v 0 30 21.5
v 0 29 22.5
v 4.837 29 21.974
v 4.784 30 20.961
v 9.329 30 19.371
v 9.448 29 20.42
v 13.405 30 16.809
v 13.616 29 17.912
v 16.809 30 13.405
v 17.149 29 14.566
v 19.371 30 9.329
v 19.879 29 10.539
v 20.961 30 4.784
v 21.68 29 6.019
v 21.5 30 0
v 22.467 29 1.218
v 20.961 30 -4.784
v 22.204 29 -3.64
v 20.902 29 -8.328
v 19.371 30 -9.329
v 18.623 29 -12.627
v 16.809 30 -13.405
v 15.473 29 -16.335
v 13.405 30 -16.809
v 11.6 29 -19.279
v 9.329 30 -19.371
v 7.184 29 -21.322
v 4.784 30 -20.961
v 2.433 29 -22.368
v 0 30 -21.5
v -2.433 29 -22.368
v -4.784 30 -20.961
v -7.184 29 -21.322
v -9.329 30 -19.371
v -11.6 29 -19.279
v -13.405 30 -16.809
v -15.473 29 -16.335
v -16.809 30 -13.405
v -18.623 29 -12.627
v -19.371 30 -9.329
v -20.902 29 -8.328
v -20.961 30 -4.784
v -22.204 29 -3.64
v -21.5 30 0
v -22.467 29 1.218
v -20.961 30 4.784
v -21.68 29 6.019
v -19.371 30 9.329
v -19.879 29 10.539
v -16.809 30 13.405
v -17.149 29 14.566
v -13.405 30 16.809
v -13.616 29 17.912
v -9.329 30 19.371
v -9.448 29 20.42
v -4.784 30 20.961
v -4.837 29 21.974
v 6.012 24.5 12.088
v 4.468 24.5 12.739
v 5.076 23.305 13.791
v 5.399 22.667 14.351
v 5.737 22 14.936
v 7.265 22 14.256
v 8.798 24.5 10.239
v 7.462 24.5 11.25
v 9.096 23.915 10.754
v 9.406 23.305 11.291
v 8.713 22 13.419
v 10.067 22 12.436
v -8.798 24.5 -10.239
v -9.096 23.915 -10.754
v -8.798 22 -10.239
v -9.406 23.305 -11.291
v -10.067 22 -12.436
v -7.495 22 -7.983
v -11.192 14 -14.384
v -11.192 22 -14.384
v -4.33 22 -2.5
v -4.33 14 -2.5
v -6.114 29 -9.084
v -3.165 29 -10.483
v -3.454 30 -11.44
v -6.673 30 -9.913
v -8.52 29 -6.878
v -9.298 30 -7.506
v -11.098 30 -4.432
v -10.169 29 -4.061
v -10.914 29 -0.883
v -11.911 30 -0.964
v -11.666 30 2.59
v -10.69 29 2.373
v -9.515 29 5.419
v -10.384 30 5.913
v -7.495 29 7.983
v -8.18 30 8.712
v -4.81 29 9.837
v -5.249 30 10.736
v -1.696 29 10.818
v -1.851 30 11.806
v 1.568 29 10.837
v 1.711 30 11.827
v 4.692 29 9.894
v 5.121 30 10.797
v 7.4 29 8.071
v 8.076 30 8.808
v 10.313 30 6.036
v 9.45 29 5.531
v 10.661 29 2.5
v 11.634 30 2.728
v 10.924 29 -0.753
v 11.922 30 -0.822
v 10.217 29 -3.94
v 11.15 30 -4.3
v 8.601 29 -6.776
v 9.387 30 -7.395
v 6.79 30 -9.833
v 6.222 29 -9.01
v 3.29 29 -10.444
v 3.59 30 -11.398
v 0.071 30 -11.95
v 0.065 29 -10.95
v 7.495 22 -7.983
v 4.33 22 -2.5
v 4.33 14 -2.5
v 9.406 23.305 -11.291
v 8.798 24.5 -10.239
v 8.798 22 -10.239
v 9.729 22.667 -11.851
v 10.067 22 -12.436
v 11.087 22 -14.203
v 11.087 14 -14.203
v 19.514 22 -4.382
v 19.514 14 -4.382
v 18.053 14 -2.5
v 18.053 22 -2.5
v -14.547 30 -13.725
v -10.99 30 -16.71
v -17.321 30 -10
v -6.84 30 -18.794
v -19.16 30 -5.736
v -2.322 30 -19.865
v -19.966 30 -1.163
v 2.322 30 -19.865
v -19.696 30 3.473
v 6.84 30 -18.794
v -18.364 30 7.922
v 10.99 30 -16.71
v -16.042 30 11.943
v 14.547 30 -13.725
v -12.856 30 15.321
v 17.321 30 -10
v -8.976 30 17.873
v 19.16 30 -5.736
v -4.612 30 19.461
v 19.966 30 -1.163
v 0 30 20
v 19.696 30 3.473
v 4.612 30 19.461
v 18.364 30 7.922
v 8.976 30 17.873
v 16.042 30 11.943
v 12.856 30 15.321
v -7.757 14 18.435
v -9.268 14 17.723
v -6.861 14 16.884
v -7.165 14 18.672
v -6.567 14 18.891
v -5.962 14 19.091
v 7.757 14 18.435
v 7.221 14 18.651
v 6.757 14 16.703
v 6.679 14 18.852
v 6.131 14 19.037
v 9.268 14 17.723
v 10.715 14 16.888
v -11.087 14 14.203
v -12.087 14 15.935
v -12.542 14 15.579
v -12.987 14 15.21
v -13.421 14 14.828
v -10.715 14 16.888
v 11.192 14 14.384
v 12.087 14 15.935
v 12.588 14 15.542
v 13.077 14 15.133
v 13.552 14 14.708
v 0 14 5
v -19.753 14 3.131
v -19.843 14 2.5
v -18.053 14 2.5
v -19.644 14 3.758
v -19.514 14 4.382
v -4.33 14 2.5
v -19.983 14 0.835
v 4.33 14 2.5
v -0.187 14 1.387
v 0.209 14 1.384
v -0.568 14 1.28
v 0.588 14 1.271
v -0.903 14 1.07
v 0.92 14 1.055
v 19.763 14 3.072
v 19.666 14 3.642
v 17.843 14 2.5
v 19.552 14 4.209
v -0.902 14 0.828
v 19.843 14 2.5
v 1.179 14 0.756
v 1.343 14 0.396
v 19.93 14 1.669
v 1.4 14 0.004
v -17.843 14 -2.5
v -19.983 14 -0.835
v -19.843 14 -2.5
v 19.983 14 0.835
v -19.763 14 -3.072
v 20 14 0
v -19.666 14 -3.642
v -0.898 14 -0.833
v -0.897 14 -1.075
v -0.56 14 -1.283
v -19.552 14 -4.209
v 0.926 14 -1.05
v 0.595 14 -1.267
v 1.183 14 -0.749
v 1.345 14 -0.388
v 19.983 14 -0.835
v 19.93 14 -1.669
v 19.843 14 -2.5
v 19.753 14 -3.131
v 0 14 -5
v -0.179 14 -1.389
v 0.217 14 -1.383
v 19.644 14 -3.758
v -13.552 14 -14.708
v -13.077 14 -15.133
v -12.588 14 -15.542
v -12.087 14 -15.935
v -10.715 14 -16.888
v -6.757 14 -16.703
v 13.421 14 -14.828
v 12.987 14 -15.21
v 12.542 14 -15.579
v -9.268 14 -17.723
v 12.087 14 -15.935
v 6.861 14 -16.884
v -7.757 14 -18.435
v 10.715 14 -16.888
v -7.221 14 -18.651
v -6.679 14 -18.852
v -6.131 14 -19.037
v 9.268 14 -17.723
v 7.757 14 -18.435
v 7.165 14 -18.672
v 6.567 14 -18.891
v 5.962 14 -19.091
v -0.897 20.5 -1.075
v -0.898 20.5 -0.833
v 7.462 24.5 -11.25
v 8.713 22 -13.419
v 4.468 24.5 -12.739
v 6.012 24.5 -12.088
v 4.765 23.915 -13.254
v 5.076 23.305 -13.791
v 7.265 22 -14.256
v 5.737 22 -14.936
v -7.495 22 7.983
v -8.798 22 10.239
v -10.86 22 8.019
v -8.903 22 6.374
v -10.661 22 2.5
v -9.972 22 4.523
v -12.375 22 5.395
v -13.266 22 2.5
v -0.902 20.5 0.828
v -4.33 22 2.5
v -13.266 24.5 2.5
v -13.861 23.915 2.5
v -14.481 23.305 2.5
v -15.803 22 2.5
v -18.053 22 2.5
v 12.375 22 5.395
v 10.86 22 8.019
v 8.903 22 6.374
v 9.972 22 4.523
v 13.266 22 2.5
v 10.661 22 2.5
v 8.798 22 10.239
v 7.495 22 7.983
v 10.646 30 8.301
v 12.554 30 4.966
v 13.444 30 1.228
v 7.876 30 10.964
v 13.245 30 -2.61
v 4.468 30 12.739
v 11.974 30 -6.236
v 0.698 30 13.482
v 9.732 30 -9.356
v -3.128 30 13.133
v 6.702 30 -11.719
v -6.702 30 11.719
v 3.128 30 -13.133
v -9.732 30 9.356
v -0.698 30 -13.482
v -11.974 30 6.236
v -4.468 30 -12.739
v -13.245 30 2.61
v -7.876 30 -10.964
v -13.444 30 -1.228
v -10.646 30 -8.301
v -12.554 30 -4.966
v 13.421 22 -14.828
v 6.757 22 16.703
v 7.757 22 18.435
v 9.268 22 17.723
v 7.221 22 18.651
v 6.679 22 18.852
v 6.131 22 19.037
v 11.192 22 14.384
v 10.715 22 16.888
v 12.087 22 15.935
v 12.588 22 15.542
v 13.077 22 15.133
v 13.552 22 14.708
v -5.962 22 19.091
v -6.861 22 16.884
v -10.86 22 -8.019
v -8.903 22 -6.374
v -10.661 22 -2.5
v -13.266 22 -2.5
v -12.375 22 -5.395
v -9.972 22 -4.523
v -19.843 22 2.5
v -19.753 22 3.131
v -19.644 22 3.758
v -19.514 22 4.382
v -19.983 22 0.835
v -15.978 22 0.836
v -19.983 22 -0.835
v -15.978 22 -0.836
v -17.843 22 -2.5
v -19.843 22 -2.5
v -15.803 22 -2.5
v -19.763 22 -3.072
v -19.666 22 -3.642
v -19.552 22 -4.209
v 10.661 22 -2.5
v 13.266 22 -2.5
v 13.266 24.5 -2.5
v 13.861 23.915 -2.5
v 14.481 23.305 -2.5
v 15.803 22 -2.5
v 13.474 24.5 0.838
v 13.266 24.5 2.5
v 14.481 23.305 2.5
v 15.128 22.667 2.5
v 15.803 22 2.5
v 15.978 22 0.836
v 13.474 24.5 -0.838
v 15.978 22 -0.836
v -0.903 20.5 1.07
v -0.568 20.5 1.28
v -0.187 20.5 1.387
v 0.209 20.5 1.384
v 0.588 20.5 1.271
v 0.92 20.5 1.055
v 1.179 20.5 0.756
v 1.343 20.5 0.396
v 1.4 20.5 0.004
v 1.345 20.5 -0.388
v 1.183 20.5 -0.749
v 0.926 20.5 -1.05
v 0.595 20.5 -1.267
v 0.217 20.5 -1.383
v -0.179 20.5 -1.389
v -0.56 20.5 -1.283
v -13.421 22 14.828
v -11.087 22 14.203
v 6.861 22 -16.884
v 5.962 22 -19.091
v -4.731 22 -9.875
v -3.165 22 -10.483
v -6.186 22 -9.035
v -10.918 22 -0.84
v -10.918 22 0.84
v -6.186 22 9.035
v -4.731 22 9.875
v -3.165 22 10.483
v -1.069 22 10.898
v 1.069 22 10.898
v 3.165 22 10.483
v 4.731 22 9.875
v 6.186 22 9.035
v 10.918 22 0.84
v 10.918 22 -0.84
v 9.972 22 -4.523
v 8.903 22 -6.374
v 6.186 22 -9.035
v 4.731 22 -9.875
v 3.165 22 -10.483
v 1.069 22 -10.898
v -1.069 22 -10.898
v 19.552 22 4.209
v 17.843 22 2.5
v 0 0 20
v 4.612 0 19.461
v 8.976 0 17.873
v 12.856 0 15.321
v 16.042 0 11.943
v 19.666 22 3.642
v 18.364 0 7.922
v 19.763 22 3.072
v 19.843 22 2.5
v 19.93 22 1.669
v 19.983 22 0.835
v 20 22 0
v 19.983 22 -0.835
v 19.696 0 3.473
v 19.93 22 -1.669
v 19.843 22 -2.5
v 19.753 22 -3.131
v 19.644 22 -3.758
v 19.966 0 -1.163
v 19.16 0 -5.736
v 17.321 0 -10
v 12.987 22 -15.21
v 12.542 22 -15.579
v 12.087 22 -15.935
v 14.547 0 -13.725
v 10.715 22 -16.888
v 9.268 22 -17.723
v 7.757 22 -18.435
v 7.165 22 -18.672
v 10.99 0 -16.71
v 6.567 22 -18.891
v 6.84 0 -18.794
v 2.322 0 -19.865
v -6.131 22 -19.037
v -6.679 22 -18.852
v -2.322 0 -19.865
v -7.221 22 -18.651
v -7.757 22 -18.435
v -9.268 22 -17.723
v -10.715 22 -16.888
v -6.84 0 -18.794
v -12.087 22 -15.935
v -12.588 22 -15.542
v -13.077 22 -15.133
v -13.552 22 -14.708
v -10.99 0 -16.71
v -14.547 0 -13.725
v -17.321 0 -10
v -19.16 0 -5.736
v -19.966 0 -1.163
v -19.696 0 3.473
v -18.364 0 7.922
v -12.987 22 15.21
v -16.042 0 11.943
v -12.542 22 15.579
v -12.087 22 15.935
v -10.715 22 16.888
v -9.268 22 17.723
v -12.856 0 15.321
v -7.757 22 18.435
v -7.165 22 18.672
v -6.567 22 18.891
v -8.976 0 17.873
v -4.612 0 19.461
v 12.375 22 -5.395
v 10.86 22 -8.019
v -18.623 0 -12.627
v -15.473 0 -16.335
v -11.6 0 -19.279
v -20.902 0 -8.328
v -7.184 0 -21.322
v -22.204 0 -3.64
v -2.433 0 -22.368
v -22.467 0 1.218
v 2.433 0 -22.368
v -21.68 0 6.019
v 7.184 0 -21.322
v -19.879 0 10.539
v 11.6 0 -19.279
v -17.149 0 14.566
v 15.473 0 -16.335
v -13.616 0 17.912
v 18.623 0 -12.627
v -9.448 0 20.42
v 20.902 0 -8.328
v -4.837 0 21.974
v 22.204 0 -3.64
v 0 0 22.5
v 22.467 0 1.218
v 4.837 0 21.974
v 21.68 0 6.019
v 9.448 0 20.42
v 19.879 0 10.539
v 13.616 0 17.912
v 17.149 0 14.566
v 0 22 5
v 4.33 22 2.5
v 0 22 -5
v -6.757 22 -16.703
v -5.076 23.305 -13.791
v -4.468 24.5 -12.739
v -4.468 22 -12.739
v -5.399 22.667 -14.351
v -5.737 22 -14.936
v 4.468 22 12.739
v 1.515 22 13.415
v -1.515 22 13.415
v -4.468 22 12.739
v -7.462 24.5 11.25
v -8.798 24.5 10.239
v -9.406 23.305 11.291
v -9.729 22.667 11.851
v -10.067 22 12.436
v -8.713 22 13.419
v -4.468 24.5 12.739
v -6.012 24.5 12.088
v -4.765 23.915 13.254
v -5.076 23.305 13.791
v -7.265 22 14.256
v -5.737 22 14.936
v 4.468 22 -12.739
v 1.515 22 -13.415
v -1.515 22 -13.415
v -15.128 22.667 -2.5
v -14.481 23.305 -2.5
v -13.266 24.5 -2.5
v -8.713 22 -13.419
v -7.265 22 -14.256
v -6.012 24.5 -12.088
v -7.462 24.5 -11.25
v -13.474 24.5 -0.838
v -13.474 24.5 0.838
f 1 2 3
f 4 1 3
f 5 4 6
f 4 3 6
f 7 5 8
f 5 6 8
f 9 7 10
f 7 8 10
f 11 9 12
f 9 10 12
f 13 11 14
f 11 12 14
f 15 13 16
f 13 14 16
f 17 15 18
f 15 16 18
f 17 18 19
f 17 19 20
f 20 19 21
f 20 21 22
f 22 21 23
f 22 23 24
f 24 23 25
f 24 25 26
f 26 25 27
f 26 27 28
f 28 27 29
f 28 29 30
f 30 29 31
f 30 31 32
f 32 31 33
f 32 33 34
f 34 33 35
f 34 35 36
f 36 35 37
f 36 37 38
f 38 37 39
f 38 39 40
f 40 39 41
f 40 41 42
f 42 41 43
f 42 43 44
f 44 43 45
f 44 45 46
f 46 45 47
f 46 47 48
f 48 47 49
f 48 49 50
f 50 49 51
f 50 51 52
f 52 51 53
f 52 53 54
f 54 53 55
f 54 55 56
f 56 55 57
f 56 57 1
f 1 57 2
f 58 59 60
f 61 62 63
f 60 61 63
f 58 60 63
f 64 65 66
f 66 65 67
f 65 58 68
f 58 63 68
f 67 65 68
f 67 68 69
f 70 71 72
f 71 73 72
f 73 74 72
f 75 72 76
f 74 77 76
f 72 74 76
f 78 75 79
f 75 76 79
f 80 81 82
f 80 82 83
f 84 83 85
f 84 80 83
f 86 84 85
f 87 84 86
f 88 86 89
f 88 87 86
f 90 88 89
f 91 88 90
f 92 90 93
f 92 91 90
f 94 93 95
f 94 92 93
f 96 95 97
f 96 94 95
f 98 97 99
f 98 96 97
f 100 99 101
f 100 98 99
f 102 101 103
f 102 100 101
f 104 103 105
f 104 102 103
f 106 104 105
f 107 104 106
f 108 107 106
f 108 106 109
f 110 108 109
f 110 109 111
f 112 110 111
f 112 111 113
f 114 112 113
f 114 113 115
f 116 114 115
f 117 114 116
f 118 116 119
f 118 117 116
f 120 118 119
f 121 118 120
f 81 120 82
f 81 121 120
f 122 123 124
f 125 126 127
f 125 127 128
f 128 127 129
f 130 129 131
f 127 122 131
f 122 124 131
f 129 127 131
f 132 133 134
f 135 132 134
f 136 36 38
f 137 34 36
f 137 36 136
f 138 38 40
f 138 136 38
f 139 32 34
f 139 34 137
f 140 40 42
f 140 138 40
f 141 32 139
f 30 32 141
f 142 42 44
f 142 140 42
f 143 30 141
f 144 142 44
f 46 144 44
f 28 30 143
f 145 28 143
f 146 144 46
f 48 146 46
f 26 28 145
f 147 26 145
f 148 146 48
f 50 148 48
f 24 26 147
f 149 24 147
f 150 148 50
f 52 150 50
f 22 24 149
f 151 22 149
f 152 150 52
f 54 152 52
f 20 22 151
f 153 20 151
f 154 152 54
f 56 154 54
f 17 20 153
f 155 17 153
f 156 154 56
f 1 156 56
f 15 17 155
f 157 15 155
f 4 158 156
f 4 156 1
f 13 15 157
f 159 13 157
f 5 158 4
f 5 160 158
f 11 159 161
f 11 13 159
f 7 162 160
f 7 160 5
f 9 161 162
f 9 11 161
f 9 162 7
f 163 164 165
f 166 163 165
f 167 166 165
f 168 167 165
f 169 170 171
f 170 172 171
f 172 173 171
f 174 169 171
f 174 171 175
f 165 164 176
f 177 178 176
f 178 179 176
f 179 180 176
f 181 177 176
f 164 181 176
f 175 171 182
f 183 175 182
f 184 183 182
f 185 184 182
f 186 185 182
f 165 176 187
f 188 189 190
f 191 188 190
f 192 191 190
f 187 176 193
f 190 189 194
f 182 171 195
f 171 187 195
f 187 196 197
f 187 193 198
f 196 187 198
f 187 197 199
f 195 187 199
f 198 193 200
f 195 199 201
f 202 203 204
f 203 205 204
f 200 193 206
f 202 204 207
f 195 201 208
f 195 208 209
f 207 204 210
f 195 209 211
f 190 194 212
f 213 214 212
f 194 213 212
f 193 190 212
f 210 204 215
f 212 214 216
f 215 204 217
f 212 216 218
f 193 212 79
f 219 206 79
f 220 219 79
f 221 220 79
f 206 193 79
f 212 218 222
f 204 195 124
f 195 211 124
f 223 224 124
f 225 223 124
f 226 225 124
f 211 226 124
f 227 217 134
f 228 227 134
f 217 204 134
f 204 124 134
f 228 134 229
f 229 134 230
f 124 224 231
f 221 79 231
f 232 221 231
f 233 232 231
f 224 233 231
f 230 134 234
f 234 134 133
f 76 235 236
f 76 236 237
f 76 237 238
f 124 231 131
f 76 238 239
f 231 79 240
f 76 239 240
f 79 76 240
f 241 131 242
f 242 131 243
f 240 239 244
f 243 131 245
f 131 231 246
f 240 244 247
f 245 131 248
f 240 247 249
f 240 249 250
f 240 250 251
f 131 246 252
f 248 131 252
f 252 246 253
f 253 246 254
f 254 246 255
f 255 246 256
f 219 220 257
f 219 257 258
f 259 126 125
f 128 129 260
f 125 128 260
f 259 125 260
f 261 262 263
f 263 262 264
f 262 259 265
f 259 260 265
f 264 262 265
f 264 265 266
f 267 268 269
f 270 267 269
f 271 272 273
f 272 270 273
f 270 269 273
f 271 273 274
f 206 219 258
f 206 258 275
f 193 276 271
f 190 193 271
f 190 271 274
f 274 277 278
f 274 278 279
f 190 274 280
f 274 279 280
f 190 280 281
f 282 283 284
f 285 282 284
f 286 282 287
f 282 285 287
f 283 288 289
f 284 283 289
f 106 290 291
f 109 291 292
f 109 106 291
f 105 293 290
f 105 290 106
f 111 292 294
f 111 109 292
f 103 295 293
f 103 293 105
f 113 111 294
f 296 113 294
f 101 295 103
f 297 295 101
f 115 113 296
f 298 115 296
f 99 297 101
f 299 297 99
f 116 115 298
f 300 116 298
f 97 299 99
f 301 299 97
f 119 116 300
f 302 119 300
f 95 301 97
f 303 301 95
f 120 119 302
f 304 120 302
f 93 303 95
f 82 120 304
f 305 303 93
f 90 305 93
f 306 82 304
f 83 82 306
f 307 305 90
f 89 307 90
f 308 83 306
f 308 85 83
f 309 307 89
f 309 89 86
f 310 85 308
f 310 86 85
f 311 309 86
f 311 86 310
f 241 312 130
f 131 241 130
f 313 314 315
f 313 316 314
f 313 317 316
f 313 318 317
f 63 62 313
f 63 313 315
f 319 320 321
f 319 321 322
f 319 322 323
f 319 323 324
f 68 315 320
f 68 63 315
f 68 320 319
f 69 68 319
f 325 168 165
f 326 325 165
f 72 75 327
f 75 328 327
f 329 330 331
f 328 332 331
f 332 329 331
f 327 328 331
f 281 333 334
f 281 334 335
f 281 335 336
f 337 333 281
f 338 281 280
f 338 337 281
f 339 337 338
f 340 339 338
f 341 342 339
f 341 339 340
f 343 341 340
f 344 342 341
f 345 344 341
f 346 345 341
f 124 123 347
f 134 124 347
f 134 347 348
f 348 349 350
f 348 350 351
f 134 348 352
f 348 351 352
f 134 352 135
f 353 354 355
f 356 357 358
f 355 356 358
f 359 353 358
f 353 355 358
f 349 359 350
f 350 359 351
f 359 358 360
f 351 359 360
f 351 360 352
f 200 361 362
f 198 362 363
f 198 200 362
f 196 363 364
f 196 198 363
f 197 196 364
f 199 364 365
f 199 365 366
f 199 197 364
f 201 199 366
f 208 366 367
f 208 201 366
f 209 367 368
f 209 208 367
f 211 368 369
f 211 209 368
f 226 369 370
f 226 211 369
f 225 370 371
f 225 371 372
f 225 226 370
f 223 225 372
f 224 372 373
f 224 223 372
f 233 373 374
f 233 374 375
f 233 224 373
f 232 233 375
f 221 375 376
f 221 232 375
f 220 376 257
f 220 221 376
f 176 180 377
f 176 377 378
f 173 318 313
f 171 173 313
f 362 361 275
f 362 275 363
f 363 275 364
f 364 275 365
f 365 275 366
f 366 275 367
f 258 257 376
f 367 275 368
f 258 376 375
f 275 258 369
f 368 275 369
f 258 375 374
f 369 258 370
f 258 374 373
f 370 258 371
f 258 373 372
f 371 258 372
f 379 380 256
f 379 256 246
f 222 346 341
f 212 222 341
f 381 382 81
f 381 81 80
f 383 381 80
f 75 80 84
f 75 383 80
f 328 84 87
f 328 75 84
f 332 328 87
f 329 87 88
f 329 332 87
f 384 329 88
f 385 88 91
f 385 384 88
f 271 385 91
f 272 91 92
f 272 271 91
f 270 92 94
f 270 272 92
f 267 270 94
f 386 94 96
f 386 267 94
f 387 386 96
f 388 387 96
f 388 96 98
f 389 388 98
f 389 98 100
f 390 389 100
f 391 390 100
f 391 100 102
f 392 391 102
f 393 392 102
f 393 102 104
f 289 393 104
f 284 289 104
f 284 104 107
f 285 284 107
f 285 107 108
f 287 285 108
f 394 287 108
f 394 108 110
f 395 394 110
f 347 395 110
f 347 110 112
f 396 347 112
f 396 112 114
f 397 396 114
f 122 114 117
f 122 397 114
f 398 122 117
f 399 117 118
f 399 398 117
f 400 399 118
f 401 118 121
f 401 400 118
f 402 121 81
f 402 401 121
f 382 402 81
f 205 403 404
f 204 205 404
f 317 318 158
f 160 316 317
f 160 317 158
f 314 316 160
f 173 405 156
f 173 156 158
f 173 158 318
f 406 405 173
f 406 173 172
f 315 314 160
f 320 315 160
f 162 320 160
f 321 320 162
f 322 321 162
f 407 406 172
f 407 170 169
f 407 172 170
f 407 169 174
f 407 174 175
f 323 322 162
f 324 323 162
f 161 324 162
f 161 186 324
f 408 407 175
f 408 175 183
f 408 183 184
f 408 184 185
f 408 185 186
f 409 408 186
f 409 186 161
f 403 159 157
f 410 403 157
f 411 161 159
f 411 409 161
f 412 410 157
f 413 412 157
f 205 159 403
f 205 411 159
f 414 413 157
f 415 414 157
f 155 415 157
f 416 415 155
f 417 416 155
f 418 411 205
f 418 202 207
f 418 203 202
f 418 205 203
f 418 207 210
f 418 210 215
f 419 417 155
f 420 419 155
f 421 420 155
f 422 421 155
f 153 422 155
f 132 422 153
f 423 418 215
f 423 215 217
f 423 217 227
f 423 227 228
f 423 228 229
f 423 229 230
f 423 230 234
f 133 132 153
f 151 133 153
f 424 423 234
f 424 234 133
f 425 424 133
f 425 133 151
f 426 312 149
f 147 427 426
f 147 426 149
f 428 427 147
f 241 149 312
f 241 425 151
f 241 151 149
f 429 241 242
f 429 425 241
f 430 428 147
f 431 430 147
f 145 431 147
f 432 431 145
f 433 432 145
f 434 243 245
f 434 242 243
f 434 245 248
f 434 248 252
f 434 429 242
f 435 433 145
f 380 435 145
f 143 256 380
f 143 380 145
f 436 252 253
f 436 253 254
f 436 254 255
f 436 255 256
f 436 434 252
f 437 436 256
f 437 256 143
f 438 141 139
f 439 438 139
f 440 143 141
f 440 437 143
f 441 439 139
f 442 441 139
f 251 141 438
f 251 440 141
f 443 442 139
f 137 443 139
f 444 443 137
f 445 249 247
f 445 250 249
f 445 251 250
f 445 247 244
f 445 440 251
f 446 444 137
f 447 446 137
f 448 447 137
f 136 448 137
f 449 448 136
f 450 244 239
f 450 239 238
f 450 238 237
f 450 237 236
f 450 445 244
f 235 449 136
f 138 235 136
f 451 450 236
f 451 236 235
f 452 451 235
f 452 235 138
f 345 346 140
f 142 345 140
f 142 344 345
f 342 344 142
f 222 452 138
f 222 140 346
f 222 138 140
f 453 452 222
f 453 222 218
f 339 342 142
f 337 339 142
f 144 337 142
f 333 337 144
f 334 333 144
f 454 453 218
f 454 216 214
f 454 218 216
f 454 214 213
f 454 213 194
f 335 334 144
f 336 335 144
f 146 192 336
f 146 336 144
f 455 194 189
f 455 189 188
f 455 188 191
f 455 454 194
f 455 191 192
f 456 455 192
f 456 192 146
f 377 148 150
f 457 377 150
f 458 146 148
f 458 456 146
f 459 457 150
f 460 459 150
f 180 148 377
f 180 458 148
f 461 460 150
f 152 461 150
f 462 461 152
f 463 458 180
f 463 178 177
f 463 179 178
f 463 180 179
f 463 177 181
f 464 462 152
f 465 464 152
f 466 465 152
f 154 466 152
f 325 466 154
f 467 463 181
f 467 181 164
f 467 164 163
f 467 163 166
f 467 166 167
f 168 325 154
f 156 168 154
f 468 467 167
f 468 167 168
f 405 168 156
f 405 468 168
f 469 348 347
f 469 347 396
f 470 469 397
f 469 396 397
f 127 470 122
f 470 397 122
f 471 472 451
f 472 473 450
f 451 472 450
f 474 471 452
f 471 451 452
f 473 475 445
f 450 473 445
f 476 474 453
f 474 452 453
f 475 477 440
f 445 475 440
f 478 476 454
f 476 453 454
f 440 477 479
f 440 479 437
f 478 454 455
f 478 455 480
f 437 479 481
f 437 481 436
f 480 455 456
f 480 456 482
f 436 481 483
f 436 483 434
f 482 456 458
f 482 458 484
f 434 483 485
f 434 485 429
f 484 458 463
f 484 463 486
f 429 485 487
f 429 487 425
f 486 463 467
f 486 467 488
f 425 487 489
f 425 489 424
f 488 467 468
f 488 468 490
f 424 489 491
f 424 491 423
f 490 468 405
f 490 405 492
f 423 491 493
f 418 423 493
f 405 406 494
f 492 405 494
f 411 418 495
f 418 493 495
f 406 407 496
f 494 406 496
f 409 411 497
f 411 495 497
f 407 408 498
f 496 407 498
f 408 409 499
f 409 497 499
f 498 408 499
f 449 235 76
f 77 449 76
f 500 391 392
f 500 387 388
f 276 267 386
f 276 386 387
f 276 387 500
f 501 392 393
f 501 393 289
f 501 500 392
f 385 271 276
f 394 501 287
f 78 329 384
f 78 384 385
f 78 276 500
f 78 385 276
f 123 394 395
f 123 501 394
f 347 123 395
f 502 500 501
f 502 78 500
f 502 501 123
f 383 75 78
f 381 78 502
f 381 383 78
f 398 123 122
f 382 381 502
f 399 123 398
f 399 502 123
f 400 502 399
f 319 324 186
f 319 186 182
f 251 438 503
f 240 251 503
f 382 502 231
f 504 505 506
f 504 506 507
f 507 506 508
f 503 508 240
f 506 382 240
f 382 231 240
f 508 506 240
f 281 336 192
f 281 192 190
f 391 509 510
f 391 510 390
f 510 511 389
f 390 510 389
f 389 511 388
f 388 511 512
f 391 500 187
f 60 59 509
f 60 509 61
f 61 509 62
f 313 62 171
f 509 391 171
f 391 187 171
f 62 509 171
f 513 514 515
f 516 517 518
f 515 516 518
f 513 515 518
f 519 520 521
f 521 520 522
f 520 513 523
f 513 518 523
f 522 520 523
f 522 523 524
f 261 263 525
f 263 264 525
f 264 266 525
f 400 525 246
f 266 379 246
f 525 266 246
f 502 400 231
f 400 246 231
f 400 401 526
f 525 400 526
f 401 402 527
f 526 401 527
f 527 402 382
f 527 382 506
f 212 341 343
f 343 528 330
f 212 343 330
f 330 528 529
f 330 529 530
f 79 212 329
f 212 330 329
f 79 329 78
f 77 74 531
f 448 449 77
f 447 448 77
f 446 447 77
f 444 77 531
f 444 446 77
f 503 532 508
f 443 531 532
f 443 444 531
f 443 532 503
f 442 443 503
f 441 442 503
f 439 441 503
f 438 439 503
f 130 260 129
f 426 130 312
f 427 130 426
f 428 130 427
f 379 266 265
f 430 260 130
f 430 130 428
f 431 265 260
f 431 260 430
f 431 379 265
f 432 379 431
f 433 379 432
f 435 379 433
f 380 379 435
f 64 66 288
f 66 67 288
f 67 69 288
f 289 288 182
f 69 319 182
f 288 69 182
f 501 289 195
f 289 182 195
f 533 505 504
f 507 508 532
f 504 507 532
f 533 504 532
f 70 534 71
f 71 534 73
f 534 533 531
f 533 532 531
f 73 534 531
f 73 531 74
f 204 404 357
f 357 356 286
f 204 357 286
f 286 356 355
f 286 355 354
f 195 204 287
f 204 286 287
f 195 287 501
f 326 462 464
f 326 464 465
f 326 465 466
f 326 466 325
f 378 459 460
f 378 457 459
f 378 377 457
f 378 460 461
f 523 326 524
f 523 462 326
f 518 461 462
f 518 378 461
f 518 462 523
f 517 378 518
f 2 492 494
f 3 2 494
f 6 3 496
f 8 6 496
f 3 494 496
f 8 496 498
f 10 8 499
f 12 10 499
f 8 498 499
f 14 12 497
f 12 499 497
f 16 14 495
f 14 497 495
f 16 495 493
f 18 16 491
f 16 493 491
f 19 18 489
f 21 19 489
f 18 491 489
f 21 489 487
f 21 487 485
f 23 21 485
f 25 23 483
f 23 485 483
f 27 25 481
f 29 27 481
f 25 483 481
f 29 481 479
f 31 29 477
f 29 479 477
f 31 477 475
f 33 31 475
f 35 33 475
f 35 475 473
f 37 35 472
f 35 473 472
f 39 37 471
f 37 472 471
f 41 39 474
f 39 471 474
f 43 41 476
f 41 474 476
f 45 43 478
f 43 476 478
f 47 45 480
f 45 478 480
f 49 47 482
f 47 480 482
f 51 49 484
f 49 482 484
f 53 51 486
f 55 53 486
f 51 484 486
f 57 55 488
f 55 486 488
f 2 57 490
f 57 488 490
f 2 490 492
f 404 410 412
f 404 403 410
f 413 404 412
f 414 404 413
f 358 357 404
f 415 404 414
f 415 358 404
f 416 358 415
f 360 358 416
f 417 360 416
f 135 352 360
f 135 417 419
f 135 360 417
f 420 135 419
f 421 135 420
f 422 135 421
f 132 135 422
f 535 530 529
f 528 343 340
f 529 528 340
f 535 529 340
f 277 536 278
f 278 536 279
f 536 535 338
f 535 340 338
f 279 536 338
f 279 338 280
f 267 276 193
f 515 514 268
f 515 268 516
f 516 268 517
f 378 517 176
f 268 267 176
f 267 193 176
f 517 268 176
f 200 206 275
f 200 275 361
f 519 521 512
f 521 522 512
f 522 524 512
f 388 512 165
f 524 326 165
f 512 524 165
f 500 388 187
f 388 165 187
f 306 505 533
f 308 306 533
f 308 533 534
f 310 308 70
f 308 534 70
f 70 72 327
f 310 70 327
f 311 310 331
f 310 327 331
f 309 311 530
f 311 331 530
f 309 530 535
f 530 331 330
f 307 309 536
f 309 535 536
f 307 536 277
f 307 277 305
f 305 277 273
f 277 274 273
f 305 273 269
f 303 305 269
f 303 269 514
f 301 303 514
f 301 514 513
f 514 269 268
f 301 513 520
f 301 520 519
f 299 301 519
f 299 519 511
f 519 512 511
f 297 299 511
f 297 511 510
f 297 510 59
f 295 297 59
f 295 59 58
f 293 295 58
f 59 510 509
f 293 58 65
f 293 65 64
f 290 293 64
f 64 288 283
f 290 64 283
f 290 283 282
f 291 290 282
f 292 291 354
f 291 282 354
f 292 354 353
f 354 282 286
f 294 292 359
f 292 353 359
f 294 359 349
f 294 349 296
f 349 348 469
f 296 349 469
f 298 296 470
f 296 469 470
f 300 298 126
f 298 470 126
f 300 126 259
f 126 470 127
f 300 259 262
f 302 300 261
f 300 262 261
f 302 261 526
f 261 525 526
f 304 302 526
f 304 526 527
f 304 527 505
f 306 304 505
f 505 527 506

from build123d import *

# Parameters (mm, degrees)
SKETCH1_R               = 22.5
SKETCH1_R_2             = 20
BOSS_EXTRUDE1_DEPTH     = 30
BOSS_EXTRUDE2_DEPTH     = 4
CHAMFER1_SIZE           = 2
CHAMFER1_SIZE_2         = 1.79025908
CUT_EXTRUDE1_DEPTH      = 39.684622268
CUT_EXTRUDE1_DEPTH_BACK = 39.684622268
BOSS_EXTRUDE3_START     = -1.5
BOSS_EXTRUDE3_DEPTH     = 1.5
SKETCH6_R               = 13.5
SKETCH6_R_2             = 10.95
BOSS_EXTRUDE4_DEPTH     = 8
CHAMFER2_SIZE           = 1
CHAMFER3_SIZE           = 1
CHAMFER4_SIZE           = 2.5


with BuildPart() as part:
    # Sketch1 → Boss-Extrude1 (new body)
    with BuildSketch(Plane(origin=(0, 0, 0), x_dir=(1, 0, 0), z_dir=(0, 1, 0))):
        with Locations(Location((0, 0, 0), (0, 0, 270))):
            Circle(SKETCH1_R)
        with Locations(Location((0, 0, 0), (0, 0, 270))):
            Circle(SKETCH1_R_2, mode=Mode.SUBTRACT)
    extrude(amount=BOSS_EXTRUDE1_DEPTH)

    # Sketch2 → Boss-Extrude2 (add, symmetric)
    with BuildSketch(Plane(origin=(0, 18, 0), x_dir=(1, 0, 0), z_dir=(0, 1, 0))):
        with BuildLine():
            Line((-12.086630926, 15.934658856), (-4.330127019, 2.5))
            Line((-4.330127019, 2.5), (-19.843134833, 2.5))
            ThreePointArc((-19.843134833, 2.5), (-20, 0), (-19.843134833, -2.5))
            Line((-19.843134833, -2.5), (-4.330127019, -2.5))
            Line((-4.330127019, -2.5), (-12.086630926, -15.934658856))
            ThreePointArc((-12.086630926, -15.934658856), (-10, -17.320508076), (-7.756503907, -18.434658856))
            Line((-7.756503907, -18.434658856), (0, -5))
            Line((0, -5), (7.756503907, -18.434658856))
            ThreePointArc((7.756503907, -18.434658856), (10, -17.320508076), (12.086630926, -15.934658856))
            Line((12.086630926, -15.934658856), (4.330127019, -2.5))
            Line((4.330127019, -2.5), (19.843134833, -2.5))
            ThreePointArc((19.843134833, -2.5), (19.960745185, -1.252458251), (20, 0))
            ThreePointArc((20, 0), (19.960745185, 1.252458251), (19.843134833, 2.5))
            Line((19.843134833, 2.5), (4.330127019, 2.5))
            Line((4.330127019, 2.5), (12.086630926, 15.934658856))
            ThreePointArc((12.086630926, 15.934658856), (10, 17.320508076), (7.756503907, 18.434658856))
            Line((7.756503907, 18.434658856), (0, 5))
            Line((0, 5), (-7.756503907, 18.434658856))
            ThreePointArc((-7.756503907, 18.434658856), (-10, 17.320508076), (-12.086630926, 15.934658856))
        make_face()
    extrude(amount=BOSS_EXTRUDE2_DEPTH, both=True)

    # Chamfer1
    # the kernel refuses this chamfer: 2, 1.79025908 mm, written as the material it adds along each edge
    with BuildSketch(Plane(origin=(7.756503907, 22, 18.434658856), x_dir=(-0.9376749432180777, 0, 0.34751359809505994), z_dir=(0, -1, 0)), Plane(origin=(19.843134833, 22, 2.5), x_dir=(-0.16788186749818226, 0, 0.9858071203665161), z_dir=(0, -1, 0)), Plane(origin=(12.086630926, 22, -15.934658856), x_dir=(0.7697930757198956, 0, 0.6382935222714571), z_dir=(0, -1, 0)), Plane(origin=(-7.756503907, 22, -18.434658856), x_dir=(0.9376749432180783, 0, -0.34751359809505833), z_dir=(0, -1, 0)), Plane(origin=(-19.843134833, 22, -2.5), x_dir=(0.1678818674981782, 0, -0.9858071203665167), z_dir=(0, -1, 0)), Plane(origin=(-12.086630926, 22, 15.934658856), x_dir=(-0.7697930757198955, 0, -0.6382935222714572), z_dir=(0, -1, 0))) as chamfer1_piece_1:
        with BuildLine():
            Line((1.733569464, 0), (CHAMFER1_SIZE * 0.167881867498, CHAMFER1_SIZE * 0.985807120367))
            Line((CHAMFER1_SIZE * 0.167881867498, CHAMFER1_SIZE * 0.985807120367), (0, 0))
            ThreePointArc((0, 0), (0.889903139, -0.018778361), (1.733569464, 0))
        make_face()
    extrude(amount=8)
    with BuildSketch(Plane(origin=(12.086630926, 14, 15.934658856), x_dir=(0.7669529363679002, 0, -0.6417033531131466), z_dir=(0, 1, 0)), Plane(origin=(19.843134833, 14, -2.5), x_dir=(-0.17225493730569186, 0, -0.9850524029582447), z_dir=(0, 1, 0)), Plane(origin=(7.756503907, 14, -18.434658856), x_dir=(-0.9392078736735914, 0, -0.3433490498450975), z_dir=(0, 1, 0)), Plane(origin=(-12.086630926, 14, -15.934658856), x_dir=(-0.766952936367899, 0, 0.641703353113148), z_dir=(0, 1, 0)), Plane(origin=(-19.843134833, 14, 2.5), x_dir=(0.17225493730568892, 0, 0.9850524029582453), z_dir=(0, 1, 0)), Plane(origin=(-7.756503907, 14, 18.434658856), x_dir=(0.9392078736735913, 0, 0.3433490498450977), z_dir=(0, 1, 0))) as chamfer1_piece_2:
        with BuildLine():
            Line((1.910893878, 0), (CHAMFER1_SIZE_2 * 0.172254937261, CHAMFER1_SIZE_2 * 0.985052402702))
            Line((CHAMFER1_SIZE_2 * 0.172254937261, CHAMFER1_SIZE_2 * 0.985052402702), (0, 0))
            ThreePointArc((0, 0), (0.982338586, -0.022816928), (1.910893878, 0))
        make_face()
    extrude(amount=8)

    # Sketch4 → Cut-Extrude1 (cut, two sides: drawn at the far end of the back side and taken through both)
    with BuildSketch(Plane(origin=(0, 22, 0), x_dir=(1, 0, 0), z_dir=(0, 1, 0)).offset(-CUT_EXTRUDE1_DEPTH_BACK)):
        with BuildLine():
            Line((-0.896831774, 1.07503152), (-0.897545019, 0.833314429))
            Line((-0.897545019, 0.833314429), (-0.902447145, -0.828003111))
            Line((-0.902447145, -0.828003111), (-0.90316039, -1.069720202))
            ThreePointArc((-0.90316039, -1.069720202), (1.399993905, -0.004131026), (-0.896831774, 1.07503152))
        make_face()
    extrude(amount=CUT_EXTRUDE1_DEPTH + CUT_EXTRUDE1_DEPTH_BACK, mode=Mode.SUBTRACT)

    # Sketch5 → Boss-Extrude3 (add)
    with BuildSketch(Plane(origin=(0, 22, 0), x_dir=(1, 0, 0), z_dir=(0, 1, 0)).offset(BOSS_EXTRUDE3_START)):
        with BuildLine():
            Line((-0.896831774, 1.07503152), (-0.90316039, -1.069720202))
            ThreePointArc((-0.90316039, -1.069720202), (1.399993905, -0.004131026), (-0.896831774, 1.07503152))
        make_face()
    extrude(amount=BOSS_EXTRUDE3_DEPTH)

    # Sketch6 → Boss-Extrude4 (add)
    with BuildSketch(Plane(origin=(0, 22, 0), x_dir=(1, 0, 0), z_dir=(0, 1, 0))):
        with Locations(Location((0, 0, 0), (0, 0, 109.328070714))):
            Circle(SKETCH6_R)
        with Locations(Location((0, 0, 0), (0, 0, 106.802375663))):
            Circle(SKETCH6_R_2, mode=Mode.SUBTRACT)
    extrude(amount=BOSS_EXTRUDE4_DEPTH)

    # Chamfer2
    chamfer2_edges = [part.edges().sort_by_distance(p)[0] for p in [
        (0, 30, -22.5),
    ]]
    chamfer(chamfer2_edges, length=CHAMFER2_SIZE)

    # Chamfer3
    chamfer3_edges = [part.edges().sort_by_distance(p)[0] for p in [
        (3.165332817, 30, 10.482517262),
    ]]
    chamfer(chamfer3_edges, length=CHAMFER3_SIZE)

    # Chamfer4
    # the kernel refuses this chamfer: 2.5 mm, written as the material it adds along each edge
    with BuildSketch(Plane(origin=(0, 22, 0), x_dir=(0.7884516512749685, 0, 0.6150967351577924), z_dir=(-0.6150967351577924, 0, 0.7884516512749685))) as chamfer4_piece_1_section:
        Polygon((13.5, CHAMFER4_SIZE), (13.5 + CHAMFER4_SIZE, 0), (13.5, 0), align=None)
    chamfer4_piece_1 = revolve(axis=Axis((0, 22, 0), (0, 1, 0)), revolution_arc=75.917899148, mode=Mode.PRIVATE)
    chamfer4_piece_1 = split(chamfer4_piece_1, bisect_by=Plane(origin=(0, 22, 2.5), z_dir=(0, 0, -1)), keep=Keep.TOP, mode=Mode.PRIVATE)
    chamfer4_piece_1 = split(chamfer4_piece_1, bisect_by=Plane(origin=(0, 22, -2.5), z_dir=(0, 0, 1)), keep=Keep.TOP, mode=Mode.PRIVATE)
    add(chamfer4_piece_1)
    with BuildSketch(Plane(origin=(0, 22, 0), x_dir=(0.9269152240690147, 0, -0.3752707920809829), z_dir=(0.3752707920809829, 0, 0.9269152240690147))) as chamfer4_piece_2_section:
        Polygon((13.5, CHAMFER4_SIZE), (13.5 + CHAMFER4_SIZE, 0), (13.5, 0), align=None)
    chamfer4_piece_2 = revolve(axis=Axis((0, 22, 0), (0, 1, 0)), revolution_arc=75.917899148, mode=Mode.PRIVATE)
    chamfer4_piece_2 = split(chamfer4_piece_2, bisect_by=Plane(origin=(2.165063509, 22, 1.25), z_dir=(-0.8660254037844385, 0, -0.5000000000000003)), keep=Keep.TOP, mode=Mode.PRIVATE)
    chamfer4_piece_2 = split(chamfer4_piece_2, bisect_by=Plane(origin=(-2.165063509, 22, -1.25), z_dir=(0.8660254037844383, 0, 0.5000000000000009)), keep=Keep.TOP, mode=Mode.PRIVATE)
    add(chamfer4_piece_2)
    with BuildSketch(Plane(origin=(0, 22, 0), x_dir=(0.138463572798161, 0, -0.9903675272382311), z_dir=(0.9903675272382311, 0, 0.138463572798161))) as chamfer4_piece_3_section:
        Polygon((13.5, CHAMFER4_SIZE), (13.5 + CHAMFER4_SIZE, 0), (13.5, 0), align=None)
    chamfer4_piece_3 = revolve(axis=Axis((0, 22, 0), (0, 1, 0)), revolution_arc=75.917899148, mode=Mode.PRIVATE)
    chamfer4_piece_3 = split(chamfer4_piece_3, bisect_by=Plane(origin=(-2.165063509, 22, 1.25), z_dir=(0.8660254037844393, 0, -0.49999999999999906)), keep=Keep.TOP, mode=Mode.PRIVATE)
    chamfer4_piece_3 = split(chamfer4_piece_3, bisect_by=Plane(origin=(2.165063509, 22, -1.25), z_dir=(-0.8660254037844392, 0, 0.49999999999999917)), keep=Keep.TOP, mode=Mode.PRIVATE)
    add(chamfer4_piece_3)
    with BuildSketch(Plane(origin=(0, 22, 0), x_dir=(-0.788451651274934, 0, -0.6150967351578366), z_dir=(0.6150967351578366, 0, -0.788451651274934))) as chamfer4_piece_4_section:
        Polygon((13.5, CHAMFER4_SIZE), (13.5 + CHAMFER4_SIZE, 0), (13.5, 0), align=None)
    chamfer4_piece_4 = revolve(axis=Axis((0, 22, 0), (0, 1, 0)), revolution_arc=75.917899148, mode=Mode.PRIVATE)
    chamfer4_piece_4 = split(chamfer4_piece_4, bisect_by=Plane(origin=(0, 22, -2.5), z_dir=(0, 0, 1)), keep=Keep.TOP, mode=Mode.PRIVATE)
    chamfer4_piece_4 = split(chamfer4_piece_4, bisect_by=Plane(origin=(0, 22, 2.5), z_dir=(0, 0, -1)), keep=Keep.TOP, mode=Mode.PRIVATE)
    add(chamfer4_piece_4)
    with BuildSketch(Plane(origin=(0, 22, 0), x_dir=(-0.9269152240690146, 0, 0.375270792080983), z_dir=(-0.375270792080983, 0, -0.9269152240690146))) as chamfer4_piece_5_section:
        Polygon((13.5, CHAMFER4_SIZE), (13.5 + CHAMFER4_SIZE, 0), (13.5, 0), align=None)
    chamfer4_piece_5 = revolve(axis=Axis((0, 22, 0), (0, 1, 0)), revolution_arc=75.917899148, mode=Mode.PRIVATE)
    chamfer4_piece_5 = split(chamfer4_piece_5, bisect_by=Plane(origin=(-2.165063509, 22, -1.25), z_dir=(0.8660254037844384, 0, 0.5000000000000006)), keep=Keep.TOP, mode=Mode.PRIVATE)
    chamfer4_piece_5 = split(chamfer4_piece_5, bisect_by=Plane(origin=(2.165063509, 22, 1.25), z_dir=(-0.8660254037844386, 0, -0.5000000000000003)), keep=Keep.TOP, mode=Mode.PRIVATE)
    add(chamfer4_piece_5)
    with BuildSketch(Plane(origin=(0, 22, 0), x_dir=(-0.13846357279405325, 0, 0.9903675272388054), z_dir=(-0.9903675272388054, 0, -0.13846357279405325))) as chamfer4_piece_6_section:
        Polygon((13.5, CHAMFER4_SIZE), (13.5 + CHAMFER4_SIZE, 0), (13.5, 0), align=None)
    chamfer4_piece_6 = revolve(axis=Axis((0, 22, 0), (0, 1, 0)), revolution_arc=75.917899148, mode=Mode.PRIVATE)
    chamfer4_piece_6 = split(chamfer4_piece_6, bisect_by=Plane(origin=(-2.165063509, 22, 1.25), z_dir=(0.8660254037844392, 0, -0.4999999999999992)), keep=Keep.TOP, mode=Mode.PRIVATE)
    chamfer4_piece_6 = split(chamfer4_piece_6, bisect_by=Plane(origin=(2.165063509, 22, -1.25), z_dir=(-0.866025403784439, 0, 0.4999999999999993)), keep=Keep.TOP, mode=Mode.PRIVATE)
    add(chamfer4_piece_6)


solid = part.part
